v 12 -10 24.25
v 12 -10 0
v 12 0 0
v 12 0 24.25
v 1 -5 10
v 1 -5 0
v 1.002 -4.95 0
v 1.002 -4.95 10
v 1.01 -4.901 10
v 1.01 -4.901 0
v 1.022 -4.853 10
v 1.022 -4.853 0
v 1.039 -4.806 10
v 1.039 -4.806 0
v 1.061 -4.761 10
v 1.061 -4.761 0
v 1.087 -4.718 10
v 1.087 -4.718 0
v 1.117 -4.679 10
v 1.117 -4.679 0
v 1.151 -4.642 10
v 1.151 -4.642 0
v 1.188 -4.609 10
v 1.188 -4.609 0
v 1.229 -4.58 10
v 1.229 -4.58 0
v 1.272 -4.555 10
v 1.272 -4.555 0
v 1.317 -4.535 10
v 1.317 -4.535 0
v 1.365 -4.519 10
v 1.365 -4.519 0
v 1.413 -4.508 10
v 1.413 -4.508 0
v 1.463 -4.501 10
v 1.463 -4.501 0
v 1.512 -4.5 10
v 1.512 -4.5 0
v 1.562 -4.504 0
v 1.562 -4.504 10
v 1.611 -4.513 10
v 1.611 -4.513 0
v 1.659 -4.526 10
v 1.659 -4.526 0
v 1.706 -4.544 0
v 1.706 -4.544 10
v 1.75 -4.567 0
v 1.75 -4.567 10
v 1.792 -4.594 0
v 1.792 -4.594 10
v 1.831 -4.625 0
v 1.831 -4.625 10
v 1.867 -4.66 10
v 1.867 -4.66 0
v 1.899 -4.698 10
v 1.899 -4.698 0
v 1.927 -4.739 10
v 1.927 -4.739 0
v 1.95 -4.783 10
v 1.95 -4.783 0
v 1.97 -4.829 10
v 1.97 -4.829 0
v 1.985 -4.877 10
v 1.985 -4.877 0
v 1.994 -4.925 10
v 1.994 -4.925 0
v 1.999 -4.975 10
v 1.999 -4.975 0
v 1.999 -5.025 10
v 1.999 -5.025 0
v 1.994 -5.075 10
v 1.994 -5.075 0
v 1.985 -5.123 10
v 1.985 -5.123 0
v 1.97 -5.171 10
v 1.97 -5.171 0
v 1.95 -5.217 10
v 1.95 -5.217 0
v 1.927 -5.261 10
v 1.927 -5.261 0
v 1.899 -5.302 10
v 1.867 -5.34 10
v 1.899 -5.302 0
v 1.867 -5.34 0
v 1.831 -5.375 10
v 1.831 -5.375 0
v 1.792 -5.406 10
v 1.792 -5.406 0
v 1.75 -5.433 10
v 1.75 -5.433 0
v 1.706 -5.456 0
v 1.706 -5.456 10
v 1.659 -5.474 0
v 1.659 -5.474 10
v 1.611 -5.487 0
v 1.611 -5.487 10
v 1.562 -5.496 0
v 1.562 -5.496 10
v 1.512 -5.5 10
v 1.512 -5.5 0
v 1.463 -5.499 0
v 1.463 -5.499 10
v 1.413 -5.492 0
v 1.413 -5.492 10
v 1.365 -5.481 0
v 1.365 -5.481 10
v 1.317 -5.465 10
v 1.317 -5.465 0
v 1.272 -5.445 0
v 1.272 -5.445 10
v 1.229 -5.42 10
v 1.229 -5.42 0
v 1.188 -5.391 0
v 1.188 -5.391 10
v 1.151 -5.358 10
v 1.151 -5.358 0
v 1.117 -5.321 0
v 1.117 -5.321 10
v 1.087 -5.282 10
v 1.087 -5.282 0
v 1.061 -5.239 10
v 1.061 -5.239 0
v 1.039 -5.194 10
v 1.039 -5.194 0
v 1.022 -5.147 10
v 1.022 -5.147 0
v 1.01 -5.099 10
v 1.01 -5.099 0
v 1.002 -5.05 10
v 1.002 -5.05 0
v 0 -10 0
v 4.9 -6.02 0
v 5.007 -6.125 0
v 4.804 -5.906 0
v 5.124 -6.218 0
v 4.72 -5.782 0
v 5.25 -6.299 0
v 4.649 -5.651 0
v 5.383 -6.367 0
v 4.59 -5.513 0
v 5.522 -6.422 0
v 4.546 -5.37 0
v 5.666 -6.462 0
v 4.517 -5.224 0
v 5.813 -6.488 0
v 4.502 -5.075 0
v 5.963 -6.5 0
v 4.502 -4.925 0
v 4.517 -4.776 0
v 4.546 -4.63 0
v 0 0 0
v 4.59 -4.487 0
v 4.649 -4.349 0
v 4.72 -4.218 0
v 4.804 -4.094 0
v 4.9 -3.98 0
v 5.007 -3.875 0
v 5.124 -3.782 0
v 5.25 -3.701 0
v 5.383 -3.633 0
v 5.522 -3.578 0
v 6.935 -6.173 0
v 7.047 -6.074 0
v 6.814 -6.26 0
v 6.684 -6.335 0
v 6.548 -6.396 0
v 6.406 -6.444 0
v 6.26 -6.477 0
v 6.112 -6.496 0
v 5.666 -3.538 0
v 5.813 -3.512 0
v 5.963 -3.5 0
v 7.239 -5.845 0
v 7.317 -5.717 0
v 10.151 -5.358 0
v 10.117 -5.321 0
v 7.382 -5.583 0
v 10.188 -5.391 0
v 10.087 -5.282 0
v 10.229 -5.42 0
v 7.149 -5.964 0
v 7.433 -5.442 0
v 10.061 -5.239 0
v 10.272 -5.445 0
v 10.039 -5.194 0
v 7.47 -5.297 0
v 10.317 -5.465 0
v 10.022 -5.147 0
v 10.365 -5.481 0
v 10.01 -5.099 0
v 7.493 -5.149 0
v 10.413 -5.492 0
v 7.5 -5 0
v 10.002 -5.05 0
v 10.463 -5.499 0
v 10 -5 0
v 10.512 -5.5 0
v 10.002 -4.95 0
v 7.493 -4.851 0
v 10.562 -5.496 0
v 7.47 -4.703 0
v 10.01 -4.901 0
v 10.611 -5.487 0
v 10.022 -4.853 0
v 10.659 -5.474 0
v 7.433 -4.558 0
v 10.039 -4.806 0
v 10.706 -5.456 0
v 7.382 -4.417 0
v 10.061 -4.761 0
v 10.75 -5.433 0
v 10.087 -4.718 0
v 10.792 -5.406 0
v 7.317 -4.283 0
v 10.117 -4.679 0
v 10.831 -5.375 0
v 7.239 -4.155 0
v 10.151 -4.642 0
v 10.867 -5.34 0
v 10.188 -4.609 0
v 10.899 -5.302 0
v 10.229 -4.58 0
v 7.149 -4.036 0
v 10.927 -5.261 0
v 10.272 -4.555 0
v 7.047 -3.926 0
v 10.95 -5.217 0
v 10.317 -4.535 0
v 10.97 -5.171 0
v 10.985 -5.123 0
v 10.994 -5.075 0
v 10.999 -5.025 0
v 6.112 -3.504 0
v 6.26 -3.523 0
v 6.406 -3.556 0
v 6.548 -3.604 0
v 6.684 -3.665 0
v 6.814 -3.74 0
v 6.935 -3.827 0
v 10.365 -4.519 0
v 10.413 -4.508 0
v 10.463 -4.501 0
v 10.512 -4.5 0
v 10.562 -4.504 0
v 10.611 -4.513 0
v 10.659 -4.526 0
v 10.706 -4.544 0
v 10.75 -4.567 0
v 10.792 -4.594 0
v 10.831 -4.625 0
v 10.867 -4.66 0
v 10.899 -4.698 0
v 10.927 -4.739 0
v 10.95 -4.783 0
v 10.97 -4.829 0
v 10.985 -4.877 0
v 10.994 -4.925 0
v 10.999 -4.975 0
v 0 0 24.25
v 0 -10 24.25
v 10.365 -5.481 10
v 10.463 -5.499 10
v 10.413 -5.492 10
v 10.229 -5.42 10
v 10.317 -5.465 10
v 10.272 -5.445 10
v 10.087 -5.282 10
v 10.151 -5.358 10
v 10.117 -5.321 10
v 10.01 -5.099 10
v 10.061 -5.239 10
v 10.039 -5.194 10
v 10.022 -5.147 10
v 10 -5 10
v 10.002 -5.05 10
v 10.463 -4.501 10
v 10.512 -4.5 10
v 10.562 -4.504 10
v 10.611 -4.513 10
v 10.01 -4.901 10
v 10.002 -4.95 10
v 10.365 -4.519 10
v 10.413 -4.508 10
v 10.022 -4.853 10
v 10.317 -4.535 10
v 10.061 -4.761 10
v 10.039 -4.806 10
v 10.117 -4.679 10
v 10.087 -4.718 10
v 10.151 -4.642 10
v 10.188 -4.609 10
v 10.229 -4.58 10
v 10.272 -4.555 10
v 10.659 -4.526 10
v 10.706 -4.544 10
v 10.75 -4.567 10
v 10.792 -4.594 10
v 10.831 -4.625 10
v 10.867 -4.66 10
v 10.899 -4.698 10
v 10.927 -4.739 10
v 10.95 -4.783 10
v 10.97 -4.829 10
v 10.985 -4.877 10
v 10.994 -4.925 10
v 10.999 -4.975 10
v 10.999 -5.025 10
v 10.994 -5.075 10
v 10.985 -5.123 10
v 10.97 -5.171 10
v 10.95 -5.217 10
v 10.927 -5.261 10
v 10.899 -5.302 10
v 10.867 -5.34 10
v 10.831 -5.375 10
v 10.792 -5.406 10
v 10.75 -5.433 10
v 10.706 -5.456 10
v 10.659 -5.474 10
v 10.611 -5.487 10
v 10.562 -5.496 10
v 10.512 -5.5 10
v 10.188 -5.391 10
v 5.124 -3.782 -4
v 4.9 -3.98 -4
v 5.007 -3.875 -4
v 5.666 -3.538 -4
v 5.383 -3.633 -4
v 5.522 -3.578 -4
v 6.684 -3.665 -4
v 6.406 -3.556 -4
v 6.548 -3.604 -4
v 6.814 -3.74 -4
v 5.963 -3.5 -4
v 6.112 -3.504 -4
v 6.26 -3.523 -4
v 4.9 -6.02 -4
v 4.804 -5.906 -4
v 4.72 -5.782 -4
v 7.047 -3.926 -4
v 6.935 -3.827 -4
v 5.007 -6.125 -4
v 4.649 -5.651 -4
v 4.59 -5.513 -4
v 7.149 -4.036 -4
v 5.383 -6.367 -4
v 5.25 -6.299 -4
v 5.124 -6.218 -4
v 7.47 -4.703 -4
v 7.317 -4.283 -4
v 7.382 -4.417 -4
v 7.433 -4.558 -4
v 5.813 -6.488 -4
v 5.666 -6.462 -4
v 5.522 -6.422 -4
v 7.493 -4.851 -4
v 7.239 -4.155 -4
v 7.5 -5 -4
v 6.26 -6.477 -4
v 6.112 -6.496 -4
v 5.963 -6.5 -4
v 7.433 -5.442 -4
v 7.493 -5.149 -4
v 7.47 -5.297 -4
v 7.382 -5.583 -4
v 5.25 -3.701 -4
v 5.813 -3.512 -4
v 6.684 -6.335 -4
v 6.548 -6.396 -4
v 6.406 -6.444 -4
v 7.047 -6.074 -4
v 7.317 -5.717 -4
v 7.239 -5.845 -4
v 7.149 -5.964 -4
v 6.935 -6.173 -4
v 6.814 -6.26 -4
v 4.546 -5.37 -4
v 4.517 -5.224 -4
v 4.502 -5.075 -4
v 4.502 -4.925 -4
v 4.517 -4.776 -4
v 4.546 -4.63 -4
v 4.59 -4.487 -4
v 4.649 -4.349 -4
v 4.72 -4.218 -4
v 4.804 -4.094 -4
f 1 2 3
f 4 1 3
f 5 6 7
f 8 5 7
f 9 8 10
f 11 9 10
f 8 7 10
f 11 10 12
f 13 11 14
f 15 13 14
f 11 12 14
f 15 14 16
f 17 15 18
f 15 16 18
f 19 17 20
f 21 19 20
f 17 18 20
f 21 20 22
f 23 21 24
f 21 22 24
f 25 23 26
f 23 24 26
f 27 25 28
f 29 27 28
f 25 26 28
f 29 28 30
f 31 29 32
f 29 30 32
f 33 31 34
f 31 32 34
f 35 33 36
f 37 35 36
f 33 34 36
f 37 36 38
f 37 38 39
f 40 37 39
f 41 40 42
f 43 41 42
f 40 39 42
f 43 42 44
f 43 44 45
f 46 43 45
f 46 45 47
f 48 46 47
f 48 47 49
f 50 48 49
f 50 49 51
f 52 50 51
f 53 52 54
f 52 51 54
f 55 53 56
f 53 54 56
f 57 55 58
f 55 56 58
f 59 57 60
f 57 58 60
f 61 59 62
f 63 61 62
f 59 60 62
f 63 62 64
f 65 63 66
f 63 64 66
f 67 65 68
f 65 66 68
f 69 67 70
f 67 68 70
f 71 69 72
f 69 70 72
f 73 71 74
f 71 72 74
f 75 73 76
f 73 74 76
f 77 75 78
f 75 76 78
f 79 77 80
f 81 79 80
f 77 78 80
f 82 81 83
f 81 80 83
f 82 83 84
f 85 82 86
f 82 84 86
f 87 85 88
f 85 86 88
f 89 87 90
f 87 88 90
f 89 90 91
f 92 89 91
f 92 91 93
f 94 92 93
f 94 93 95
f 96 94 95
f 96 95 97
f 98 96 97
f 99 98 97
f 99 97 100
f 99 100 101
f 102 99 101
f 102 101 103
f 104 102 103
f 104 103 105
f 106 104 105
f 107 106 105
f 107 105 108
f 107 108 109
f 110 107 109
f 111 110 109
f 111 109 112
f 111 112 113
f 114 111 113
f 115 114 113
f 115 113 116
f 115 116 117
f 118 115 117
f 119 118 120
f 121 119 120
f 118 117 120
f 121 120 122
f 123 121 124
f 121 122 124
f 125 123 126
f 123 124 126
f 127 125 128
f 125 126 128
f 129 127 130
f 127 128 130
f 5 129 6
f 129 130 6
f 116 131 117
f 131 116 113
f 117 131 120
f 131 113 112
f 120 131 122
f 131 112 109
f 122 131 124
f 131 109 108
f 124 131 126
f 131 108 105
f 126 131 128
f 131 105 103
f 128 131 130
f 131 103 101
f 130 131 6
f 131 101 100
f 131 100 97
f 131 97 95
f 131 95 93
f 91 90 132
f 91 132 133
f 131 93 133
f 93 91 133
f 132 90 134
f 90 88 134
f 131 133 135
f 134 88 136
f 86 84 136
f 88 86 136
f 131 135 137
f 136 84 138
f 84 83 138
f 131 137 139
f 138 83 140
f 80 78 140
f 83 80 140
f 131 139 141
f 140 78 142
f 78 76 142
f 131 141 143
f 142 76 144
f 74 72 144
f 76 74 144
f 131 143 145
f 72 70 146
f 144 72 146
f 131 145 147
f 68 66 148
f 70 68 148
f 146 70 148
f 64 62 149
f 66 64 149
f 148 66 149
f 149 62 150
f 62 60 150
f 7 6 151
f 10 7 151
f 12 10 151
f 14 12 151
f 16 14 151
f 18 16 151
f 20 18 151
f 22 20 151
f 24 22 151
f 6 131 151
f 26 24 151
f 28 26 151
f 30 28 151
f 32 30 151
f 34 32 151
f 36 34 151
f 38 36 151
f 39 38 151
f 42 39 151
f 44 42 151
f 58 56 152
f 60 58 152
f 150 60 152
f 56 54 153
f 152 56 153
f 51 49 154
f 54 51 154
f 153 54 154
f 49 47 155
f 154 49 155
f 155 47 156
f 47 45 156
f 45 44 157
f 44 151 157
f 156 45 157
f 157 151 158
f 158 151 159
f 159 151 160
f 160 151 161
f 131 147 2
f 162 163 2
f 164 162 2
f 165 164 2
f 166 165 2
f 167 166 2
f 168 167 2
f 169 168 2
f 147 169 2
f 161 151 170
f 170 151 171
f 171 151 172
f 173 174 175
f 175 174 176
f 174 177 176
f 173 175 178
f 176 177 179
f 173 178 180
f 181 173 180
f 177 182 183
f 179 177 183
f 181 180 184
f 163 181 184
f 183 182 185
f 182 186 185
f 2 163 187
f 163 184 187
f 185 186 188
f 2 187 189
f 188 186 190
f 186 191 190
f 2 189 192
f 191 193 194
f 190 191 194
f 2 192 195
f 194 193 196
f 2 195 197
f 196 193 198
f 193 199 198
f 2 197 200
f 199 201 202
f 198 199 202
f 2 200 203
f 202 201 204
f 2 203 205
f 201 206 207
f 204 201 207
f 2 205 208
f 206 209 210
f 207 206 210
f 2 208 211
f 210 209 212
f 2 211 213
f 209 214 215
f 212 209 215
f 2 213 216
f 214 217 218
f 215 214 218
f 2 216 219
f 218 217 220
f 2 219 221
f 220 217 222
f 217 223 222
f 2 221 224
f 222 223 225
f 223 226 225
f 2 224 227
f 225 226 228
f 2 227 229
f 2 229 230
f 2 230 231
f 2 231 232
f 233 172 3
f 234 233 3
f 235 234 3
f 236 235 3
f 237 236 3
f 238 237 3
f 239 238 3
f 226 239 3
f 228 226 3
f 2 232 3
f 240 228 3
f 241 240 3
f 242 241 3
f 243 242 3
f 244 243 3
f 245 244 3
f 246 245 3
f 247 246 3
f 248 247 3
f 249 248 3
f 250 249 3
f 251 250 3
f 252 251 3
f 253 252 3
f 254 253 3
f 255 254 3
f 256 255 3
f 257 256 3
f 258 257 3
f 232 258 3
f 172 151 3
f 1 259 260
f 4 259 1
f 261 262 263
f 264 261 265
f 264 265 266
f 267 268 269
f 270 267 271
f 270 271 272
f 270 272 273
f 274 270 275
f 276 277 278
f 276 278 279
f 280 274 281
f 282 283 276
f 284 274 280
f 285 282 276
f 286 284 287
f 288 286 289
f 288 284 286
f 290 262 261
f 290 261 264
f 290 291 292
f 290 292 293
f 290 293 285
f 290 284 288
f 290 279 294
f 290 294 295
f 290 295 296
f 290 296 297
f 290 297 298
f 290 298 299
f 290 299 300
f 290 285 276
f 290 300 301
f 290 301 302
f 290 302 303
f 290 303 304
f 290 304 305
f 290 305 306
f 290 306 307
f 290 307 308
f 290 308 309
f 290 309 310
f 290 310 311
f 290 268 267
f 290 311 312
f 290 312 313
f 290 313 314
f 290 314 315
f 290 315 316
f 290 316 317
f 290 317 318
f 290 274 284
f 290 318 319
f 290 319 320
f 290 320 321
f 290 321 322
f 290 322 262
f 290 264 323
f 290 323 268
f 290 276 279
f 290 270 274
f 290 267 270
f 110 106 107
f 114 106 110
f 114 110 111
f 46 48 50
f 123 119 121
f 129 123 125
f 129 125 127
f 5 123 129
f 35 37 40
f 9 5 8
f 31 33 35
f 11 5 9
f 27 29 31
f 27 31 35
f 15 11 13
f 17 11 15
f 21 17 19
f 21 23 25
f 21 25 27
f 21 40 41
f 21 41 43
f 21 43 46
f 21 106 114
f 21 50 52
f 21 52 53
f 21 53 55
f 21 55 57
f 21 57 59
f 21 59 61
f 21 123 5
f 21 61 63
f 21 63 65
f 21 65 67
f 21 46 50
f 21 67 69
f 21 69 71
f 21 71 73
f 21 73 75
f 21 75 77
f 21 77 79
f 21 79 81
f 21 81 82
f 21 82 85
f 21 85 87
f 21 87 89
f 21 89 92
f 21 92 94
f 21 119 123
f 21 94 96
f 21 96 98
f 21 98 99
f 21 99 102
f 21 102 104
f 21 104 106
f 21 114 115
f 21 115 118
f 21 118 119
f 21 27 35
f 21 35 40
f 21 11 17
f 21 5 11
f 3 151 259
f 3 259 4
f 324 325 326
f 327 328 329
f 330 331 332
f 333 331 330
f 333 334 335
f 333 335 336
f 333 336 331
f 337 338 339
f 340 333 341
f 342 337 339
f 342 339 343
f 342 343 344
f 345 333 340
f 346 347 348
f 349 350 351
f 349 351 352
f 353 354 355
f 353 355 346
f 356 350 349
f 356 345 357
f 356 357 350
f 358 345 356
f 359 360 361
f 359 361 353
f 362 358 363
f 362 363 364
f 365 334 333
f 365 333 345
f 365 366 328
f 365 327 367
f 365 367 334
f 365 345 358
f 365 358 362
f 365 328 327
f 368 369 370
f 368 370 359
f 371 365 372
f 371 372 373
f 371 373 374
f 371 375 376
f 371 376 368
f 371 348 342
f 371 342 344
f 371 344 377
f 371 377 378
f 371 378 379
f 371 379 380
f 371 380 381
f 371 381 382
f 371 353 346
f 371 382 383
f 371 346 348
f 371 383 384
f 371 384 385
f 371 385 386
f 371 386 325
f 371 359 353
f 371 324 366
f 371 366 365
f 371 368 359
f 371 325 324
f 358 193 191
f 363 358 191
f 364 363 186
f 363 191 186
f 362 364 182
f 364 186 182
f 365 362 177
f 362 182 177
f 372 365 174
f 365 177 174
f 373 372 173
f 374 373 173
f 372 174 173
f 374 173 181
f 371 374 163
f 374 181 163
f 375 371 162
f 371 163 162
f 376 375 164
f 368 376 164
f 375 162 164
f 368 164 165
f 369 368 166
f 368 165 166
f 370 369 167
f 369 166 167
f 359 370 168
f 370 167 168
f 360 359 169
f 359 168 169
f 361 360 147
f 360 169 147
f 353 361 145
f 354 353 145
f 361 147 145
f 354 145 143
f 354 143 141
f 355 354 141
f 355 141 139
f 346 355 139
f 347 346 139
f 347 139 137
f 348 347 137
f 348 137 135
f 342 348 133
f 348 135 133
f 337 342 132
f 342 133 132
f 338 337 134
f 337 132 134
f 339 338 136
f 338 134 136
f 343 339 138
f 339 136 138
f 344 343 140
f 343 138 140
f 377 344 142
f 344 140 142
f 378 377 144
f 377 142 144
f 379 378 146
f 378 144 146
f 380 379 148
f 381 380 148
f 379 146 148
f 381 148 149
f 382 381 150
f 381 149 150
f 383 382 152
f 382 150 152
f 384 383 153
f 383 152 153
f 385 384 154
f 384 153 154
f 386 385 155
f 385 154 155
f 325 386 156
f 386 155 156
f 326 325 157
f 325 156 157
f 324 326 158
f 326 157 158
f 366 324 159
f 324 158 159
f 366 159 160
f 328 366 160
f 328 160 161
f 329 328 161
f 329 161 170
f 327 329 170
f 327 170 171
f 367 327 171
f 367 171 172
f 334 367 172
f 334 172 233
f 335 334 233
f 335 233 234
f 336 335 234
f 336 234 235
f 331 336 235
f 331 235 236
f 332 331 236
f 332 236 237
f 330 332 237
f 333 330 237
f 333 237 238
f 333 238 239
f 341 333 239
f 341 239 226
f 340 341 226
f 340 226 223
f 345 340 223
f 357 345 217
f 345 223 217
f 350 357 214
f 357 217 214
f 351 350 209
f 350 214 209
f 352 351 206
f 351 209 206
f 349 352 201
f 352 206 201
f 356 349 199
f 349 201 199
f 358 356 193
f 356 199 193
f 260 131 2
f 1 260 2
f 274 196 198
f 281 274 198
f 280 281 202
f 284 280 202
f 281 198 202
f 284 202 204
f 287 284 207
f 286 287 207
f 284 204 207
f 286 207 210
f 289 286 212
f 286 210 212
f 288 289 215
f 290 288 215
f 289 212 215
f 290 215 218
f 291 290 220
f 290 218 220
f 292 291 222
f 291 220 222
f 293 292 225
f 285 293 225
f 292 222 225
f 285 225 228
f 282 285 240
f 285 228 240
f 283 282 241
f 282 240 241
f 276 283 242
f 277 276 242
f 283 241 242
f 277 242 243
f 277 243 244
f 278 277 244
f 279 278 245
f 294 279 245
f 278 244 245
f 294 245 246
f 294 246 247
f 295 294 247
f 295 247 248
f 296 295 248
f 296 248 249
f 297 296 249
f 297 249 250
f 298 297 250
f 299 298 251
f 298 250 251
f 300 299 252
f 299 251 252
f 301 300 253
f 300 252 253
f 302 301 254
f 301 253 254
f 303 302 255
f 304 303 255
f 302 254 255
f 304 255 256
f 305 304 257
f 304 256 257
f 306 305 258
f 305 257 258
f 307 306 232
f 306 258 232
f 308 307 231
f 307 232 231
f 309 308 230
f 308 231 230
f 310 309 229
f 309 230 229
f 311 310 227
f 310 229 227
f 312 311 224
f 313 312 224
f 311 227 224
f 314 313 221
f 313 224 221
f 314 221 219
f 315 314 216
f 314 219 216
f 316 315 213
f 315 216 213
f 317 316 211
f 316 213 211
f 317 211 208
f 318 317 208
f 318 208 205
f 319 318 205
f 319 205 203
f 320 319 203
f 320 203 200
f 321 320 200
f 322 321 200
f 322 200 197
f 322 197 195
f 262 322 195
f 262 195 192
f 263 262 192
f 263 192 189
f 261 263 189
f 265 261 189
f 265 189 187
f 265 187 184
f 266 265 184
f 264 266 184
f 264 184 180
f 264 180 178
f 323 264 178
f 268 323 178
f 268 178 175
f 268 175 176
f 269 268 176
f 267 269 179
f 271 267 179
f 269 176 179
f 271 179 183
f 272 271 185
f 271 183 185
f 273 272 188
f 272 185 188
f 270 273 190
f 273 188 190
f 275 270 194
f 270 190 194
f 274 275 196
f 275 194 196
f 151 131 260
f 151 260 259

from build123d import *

# Parameters (mm, degrees)
SKETCH1_W           = 12
SKETCH1_H           = 10
BOSS_EXTRUDE1_DEPTH = 24.25
SKETCH2_R           = 0.5
CUT_EXTRUDE1_DEPTH  = 10
SKETCH3_R           = 1.5
BOSS_EXTRUDE2_DEPTH = 4


with BuildPart() as part:
    # Sketch1 → Boss-Extrude1 (new body)
    with BuildSketch(Plane.XY):
        with Locations((6, -5)):
            Rectangle(SKETCH1_W, SKETCH1_H)
    extrude(amount=BOSS_EXTRUDE1_DEPTH)

    # Sketch2 → Cut-Extrude1 (cut)
    with BuildSketch(Plane(origin=(0, 0, 0), x_dir=(-1, 0, 0), z_dir=(0, 0, -1))):
        with Locations((-10.5, -5)):
            Circle(SKETCH2_R)
        with Locations((-1.5, -5)):
            Circle(SKETCH2_R)
    extrude(amount=-CUT_EXTRUDE1_DEPTH, mode=Mode.SUBTRACT)

    # Sketch3 → Boss-Extrude2 (add)
    with BuildSketch(Plane(origin=(0, 0, 0), x_dir=(-1, 0, 0), z_dir=(0, 0, -1))):
        with Locations(Location((-6, -5, 0), (0, 0, 180))):
            Circle(SKETCH3_R)
    extrude(amount=BOSS_EXTRUDE2_DEPTH)


solid = part.part
